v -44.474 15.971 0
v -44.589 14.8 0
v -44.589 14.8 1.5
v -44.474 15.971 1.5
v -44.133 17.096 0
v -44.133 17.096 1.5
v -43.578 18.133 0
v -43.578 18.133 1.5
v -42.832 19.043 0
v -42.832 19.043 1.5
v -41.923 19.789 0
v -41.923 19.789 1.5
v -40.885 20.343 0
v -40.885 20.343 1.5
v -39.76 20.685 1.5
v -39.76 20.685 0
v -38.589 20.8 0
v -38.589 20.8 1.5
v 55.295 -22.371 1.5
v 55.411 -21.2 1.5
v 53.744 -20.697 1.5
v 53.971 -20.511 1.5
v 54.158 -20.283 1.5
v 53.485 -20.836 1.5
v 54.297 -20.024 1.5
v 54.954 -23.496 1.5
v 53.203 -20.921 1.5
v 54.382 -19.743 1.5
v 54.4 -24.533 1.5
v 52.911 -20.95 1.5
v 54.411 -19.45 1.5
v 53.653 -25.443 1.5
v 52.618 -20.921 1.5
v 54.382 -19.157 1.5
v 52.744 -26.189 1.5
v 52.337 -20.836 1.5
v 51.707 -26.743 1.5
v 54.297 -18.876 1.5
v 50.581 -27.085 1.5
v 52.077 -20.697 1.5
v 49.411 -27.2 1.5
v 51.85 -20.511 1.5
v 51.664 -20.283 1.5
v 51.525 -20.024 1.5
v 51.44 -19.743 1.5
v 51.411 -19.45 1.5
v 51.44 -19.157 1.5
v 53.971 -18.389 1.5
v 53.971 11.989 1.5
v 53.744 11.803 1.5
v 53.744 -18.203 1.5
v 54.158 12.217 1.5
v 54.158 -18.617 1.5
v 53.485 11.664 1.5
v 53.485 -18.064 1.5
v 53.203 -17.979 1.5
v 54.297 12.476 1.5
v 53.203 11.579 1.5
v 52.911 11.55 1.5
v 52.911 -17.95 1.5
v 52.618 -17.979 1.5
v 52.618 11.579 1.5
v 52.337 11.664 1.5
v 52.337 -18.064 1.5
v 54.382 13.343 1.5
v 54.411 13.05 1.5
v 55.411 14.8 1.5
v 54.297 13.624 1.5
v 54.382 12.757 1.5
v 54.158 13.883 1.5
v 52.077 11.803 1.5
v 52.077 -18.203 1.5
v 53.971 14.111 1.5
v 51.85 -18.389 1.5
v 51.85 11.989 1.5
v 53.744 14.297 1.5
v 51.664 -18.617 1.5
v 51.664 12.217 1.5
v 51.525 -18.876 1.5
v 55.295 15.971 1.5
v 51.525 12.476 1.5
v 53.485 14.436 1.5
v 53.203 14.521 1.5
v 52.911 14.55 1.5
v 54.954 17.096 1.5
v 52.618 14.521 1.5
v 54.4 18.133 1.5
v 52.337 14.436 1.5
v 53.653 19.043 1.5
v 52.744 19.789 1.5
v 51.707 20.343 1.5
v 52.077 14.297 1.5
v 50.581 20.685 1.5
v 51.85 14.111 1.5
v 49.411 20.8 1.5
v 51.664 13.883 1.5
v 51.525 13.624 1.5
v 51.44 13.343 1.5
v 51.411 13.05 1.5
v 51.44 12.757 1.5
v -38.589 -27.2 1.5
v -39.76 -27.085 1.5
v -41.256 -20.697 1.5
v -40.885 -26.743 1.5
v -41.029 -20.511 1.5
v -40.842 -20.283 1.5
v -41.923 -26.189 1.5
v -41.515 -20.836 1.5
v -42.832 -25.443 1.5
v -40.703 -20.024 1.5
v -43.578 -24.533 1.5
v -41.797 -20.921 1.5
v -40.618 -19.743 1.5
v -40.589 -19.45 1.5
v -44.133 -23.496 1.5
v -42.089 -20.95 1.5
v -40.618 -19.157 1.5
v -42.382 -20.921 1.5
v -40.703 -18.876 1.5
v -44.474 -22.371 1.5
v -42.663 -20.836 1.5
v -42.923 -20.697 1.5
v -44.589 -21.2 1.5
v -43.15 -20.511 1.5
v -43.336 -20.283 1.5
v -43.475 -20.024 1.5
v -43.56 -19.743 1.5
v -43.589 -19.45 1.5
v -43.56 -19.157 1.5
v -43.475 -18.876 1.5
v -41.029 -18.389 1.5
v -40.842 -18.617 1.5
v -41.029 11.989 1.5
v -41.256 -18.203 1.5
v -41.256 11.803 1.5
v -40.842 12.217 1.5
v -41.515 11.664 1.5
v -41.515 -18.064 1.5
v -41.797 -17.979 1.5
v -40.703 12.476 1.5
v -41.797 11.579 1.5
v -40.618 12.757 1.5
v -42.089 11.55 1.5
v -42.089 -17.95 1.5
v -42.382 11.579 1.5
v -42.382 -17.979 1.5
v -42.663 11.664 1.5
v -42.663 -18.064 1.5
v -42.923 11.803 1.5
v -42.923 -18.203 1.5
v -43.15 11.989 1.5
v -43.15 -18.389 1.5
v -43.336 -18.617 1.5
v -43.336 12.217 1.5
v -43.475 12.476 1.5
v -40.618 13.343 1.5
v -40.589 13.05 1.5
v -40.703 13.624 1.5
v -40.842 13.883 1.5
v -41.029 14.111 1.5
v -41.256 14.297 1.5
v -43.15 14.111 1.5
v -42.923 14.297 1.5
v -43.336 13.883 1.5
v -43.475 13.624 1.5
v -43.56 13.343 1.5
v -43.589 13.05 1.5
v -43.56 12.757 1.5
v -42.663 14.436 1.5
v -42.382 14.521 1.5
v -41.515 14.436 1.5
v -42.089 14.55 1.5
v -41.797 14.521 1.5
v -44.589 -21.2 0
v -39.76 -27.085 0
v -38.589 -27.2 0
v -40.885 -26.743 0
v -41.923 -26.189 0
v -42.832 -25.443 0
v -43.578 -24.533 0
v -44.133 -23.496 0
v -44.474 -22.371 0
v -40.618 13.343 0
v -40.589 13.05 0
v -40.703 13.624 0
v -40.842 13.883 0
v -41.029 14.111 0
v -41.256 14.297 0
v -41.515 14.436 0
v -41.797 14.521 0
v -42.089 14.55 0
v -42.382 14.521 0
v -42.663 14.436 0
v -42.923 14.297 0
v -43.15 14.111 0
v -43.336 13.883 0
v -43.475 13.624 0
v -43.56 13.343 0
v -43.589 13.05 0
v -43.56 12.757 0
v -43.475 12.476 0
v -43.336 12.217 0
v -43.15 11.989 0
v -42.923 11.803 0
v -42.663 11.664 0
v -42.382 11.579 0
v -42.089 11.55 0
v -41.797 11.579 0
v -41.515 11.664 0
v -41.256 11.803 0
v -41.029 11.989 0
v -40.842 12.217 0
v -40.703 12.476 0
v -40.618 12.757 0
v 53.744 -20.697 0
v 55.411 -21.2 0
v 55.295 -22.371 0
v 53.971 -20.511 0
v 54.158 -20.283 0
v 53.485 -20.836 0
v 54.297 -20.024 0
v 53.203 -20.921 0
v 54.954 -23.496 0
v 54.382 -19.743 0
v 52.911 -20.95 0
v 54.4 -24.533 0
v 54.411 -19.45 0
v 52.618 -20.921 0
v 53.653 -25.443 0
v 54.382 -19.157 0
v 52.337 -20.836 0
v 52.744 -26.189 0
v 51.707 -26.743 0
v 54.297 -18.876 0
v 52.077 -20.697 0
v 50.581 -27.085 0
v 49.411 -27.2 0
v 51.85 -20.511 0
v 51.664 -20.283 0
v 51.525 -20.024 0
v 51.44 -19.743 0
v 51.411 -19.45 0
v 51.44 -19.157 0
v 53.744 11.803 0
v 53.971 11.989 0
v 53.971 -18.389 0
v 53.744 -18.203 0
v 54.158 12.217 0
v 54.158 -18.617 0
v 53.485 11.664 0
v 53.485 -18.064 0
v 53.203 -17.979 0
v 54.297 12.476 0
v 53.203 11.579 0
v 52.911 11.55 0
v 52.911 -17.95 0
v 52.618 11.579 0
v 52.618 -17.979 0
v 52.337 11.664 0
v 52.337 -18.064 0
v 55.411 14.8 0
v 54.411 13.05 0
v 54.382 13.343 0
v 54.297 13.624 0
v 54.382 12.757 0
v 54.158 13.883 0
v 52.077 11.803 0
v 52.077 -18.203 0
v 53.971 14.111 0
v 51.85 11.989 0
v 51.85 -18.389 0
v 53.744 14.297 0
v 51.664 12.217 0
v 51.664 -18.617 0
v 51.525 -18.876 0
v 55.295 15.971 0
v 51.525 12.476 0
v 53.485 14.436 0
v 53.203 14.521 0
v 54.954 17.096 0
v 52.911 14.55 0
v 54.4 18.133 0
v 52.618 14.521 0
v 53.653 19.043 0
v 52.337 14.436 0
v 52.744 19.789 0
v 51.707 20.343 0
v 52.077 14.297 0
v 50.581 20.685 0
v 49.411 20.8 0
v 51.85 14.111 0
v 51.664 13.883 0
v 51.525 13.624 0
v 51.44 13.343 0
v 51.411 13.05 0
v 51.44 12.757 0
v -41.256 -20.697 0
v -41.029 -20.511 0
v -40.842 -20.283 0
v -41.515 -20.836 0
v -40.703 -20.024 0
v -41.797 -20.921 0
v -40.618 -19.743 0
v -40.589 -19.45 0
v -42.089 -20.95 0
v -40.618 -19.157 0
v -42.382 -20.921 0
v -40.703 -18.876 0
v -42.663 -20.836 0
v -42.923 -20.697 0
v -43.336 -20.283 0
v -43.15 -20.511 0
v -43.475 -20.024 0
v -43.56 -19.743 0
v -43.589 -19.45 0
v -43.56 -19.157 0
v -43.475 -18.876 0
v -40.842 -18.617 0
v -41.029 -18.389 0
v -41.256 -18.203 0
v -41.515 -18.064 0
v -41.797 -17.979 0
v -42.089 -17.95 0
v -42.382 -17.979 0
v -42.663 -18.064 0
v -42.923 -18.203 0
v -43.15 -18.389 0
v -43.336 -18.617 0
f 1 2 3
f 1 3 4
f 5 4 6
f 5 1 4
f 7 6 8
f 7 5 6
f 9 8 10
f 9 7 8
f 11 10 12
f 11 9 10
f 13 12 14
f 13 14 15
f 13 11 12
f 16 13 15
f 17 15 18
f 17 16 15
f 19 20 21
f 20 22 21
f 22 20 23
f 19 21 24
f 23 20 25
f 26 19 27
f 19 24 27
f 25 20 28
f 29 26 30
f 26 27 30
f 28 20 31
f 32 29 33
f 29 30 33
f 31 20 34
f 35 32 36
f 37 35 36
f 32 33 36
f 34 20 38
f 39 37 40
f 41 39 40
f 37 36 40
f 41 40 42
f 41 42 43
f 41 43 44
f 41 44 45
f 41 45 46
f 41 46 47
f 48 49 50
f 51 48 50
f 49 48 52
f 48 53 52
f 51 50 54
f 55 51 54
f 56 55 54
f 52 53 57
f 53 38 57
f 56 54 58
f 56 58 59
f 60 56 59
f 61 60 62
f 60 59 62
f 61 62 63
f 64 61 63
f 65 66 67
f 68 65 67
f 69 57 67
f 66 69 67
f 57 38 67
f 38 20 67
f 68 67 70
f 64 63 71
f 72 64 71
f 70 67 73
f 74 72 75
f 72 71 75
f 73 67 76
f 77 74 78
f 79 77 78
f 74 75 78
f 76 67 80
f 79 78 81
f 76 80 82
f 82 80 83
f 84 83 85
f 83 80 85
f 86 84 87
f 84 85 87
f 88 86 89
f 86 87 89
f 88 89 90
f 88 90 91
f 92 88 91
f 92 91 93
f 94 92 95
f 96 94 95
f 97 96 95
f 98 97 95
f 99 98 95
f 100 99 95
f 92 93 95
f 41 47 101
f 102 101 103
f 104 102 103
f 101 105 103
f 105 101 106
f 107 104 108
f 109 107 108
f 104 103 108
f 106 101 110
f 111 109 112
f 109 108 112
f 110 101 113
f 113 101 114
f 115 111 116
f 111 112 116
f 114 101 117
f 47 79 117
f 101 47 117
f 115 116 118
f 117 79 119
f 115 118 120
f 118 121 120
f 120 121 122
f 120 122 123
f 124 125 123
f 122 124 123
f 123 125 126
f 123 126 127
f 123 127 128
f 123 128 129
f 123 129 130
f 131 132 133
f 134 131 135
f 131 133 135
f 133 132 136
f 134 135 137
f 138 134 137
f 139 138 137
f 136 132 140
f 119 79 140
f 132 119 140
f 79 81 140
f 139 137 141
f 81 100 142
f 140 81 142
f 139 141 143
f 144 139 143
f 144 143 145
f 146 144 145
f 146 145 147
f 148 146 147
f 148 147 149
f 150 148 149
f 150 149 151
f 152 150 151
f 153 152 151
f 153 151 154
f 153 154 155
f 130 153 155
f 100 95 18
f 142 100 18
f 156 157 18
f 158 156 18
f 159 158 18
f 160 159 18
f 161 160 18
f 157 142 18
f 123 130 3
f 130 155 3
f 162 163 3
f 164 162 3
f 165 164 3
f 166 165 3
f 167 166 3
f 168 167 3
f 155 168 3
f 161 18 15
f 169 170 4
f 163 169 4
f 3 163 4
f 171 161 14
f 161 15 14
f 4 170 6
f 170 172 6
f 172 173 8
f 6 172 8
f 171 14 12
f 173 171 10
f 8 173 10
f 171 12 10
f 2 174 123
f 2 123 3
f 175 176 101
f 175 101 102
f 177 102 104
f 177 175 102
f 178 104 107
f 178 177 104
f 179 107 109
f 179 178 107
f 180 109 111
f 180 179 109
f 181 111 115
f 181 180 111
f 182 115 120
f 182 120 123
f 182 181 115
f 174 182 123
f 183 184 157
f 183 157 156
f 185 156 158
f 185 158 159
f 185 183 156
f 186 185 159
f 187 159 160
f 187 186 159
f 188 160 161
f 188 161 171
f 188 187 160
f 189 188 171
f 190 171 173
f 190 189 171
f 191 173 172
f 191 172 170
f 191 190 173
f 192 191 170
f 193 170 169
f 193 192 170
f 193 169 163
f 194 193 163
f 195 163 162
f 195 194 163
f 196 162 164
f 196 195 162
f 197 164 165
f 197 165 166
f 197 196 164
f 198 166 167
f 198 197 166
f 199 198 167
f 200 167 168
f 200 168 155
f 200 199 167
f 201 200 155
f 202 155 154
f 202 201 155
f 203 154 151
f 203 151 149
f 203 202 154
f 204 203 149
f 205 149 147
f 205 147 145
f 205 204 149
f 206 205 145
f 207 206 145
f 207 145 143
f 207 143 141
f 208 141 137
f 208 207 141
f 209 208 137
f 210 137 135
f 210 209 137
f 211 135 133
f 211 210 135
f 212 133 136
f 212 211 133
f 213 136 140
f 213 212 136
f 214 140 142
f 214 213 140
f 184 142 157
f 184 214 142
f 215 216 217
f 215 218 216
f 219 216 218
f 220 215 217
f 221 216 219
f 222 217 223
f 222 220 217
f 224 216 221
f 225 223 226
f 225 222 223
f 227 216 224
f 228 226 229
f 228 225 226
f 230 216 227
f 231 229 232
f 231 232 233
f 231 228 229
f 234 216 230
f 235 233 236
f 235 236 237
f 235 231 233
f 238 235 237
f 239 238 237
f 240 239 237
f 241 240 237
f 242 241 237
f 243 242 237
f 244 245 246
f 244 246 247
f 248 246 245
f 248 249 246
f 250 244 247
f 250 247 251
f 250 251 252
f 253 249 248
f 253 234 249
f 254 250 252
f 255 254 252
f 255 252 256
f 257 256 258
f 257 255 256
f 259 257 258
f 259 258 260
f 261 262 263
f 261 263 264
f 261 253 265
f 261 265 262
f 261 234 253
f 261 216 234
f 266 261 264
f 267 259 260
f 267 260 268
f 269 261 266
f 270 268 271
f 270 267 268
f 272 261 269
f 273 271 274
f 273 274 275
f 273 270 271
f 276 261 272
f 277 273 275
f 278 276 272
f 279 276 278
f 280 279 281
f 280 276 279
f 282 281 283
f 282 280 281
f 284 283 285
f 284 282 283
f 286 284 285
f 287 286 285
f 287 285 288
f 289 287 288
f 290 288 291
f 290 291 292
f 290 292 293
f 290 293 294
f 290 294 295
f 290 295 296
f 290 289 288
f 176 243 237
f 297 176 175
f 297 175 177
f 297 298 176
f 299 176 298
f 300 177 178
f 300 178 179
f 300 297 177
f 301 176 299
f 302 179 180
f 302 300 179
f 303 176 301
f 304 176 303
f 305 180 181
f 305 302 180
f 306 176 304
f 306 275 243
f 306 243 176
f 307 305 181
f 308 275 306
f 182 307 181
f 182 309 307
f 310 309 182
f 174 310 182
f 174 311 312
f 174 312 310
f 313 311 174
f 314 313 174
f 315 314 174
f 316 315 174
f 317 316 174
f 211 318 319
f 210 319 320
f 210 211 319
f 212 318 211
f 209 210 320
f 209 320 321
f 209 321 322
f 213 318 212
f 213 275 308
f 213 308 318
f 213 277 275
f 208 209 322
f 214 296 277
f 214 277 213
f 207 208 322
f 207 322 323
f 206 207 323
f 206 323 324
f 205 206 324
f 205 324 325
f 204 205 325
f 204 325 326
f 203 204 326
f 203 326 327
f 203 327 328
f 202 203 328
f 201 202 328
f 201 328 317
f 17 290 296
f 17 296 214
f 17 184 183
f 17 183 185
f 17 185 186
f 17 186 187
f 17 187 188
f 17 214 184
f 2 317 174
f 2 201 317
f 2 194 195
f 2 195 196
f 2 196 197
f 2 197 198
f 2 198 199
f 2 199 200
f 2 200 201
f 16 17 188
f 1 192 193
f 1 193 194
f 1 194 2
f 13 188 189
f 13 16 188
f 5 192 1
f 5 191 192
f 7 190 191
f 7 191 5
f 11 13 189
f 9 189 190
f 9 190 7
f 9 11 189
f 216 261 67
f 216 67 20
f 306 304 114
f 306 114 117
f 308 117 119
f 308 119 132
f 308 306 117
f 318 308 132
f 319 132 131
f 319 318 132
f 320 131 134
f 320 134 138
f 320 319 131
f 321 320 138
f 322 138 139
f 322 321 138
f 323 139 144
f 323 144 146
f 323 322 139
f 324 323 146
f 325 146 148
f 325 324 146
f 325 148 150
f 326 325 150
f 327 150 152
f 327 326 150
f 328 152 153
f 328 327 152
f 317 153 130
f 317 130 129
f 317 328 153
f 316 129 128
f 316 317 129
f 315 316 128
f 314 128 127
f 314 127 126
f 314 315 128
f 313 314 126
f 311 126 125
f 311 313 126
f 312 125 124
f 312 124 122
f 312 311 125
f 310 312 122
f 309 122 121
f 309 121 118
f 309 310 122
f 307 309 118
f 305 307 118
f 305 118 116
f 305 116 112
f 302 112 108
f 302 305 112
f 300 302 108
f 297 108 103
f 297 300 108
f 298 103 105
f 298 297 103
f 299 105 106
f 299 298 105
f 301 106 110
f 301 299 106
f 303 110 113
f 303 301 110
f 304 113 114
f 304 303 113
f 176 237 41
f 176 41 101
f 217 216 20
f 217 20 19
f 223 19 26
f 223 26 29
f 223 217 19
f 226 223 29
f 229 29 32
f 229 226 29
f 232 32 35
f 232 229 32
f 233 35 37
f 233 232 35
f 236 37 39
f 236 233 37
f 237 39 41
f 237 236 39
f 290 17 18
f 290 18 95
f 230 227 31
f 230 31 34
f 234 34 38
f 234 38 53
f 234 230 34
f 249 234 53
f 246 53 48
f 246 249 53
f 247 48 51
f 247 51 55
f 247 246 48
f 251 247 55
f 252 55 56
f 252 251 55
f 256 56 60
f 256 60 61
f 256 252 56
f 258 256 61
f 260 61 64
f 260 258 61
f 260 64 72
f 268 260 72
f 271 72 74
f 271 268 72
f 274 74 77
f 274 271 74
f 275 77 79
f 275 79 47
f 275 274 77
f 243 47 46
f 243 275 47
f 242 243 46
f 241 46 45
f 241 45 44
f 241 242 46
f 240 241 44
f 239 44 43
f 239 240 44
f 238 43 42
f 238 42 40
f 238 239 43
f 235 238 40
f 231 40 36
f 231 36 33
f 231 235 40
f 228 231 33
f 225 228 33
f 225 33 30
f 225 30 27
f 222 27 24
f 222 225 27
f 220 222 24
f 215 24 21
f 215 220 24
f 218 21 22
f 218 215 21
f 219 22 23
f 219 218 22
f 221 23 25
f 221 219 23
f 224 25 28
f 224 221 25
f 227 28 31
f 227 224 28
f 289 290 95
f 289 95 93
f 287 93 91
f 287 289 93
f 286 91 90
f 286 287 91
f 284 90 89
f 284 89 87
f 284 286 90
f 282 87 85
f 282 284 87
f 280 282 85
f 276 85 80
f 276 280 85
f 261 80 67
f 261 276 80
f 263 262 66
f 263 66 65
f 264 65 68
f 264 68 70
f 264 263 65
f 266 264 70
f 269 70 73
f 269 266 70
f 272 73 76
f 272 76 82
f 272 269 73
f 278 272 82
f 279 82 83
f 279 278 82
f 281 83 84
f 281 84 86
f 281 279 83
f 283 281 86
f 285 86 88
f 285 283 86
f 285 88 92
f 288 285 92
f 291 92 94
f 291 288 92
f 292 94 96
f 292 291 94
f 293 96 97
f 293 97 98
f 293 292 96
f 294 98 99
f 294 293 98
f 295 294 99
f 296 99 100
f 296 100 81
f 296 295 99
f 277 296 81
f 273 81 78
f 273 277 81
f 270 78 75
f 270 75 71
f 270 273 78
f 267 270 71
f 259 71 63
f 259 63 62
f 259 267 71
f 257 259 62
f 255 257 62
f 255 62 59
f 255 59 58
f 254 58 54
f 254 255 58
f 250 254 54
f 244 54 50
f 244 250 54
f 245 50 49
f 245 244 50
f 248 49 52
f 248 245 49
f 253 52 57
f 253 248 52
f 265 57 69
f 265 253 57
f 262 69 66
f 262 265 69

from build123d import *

# Parameters (mm, degrees)
CROQUIS1_R              = 1.5
SALIENTE_EXTRUIR1_DEPTH = 1.5


with BuildPart() as part:
    # Croquis1 → Saliente-Extruir1 (new body)
    with BuildSketch(Plane.XY):
        with BuildLine():
            Line((-38.589251844, 20.8), (49.410748156, 20.8))
            ThreePointArc((49.410748156, 20.8), (53.653388843, 19.042640687), (55.410748156, 14.8))
            Line((55.410748156, 14.8), (55.410748156, -21.2))
            ThreePointArc((55.410748156, -21.2), (53.653388843, -25.442640687), (49.410748156, -27.2))
            Line((49.410748156, -27.2), (-38.589251844, -27.2))
            ThreePointArc((-38.589251844, -27.2), (-42.831892531, -25.442640687), (-44.589251844, -21.2))
            Line((-44.589251844, -21.2), (-44.589251844, 14.8))
            ThreePointArc((-44.589251844, 14.8), (-42.831892531, 19.042640687), (-38.589251844, 20.8))
        make_face()
        with Locations((-42.089251844, 13.05)):
            Circle(CROQUIS1_R, mode=Mode.SUBTRACT)
        with Locations((-42.089251844, -19.45)):
            Circle(CROQUIS1_R, mode=Mode.SUBTRACT)
        with Locations((52.910748156, -19.45)):
            Circle(CROQUIS1_R, mode=Mode.SUBTRACT)
        with Locations((52.910748156, 13.05)):
            Circle(CROQUIS1_R, mode=Mode.SUBTRACT)
    extrude(amount=SALIENTE_EXTRUIR1_DEPTH)


solid = part.part
